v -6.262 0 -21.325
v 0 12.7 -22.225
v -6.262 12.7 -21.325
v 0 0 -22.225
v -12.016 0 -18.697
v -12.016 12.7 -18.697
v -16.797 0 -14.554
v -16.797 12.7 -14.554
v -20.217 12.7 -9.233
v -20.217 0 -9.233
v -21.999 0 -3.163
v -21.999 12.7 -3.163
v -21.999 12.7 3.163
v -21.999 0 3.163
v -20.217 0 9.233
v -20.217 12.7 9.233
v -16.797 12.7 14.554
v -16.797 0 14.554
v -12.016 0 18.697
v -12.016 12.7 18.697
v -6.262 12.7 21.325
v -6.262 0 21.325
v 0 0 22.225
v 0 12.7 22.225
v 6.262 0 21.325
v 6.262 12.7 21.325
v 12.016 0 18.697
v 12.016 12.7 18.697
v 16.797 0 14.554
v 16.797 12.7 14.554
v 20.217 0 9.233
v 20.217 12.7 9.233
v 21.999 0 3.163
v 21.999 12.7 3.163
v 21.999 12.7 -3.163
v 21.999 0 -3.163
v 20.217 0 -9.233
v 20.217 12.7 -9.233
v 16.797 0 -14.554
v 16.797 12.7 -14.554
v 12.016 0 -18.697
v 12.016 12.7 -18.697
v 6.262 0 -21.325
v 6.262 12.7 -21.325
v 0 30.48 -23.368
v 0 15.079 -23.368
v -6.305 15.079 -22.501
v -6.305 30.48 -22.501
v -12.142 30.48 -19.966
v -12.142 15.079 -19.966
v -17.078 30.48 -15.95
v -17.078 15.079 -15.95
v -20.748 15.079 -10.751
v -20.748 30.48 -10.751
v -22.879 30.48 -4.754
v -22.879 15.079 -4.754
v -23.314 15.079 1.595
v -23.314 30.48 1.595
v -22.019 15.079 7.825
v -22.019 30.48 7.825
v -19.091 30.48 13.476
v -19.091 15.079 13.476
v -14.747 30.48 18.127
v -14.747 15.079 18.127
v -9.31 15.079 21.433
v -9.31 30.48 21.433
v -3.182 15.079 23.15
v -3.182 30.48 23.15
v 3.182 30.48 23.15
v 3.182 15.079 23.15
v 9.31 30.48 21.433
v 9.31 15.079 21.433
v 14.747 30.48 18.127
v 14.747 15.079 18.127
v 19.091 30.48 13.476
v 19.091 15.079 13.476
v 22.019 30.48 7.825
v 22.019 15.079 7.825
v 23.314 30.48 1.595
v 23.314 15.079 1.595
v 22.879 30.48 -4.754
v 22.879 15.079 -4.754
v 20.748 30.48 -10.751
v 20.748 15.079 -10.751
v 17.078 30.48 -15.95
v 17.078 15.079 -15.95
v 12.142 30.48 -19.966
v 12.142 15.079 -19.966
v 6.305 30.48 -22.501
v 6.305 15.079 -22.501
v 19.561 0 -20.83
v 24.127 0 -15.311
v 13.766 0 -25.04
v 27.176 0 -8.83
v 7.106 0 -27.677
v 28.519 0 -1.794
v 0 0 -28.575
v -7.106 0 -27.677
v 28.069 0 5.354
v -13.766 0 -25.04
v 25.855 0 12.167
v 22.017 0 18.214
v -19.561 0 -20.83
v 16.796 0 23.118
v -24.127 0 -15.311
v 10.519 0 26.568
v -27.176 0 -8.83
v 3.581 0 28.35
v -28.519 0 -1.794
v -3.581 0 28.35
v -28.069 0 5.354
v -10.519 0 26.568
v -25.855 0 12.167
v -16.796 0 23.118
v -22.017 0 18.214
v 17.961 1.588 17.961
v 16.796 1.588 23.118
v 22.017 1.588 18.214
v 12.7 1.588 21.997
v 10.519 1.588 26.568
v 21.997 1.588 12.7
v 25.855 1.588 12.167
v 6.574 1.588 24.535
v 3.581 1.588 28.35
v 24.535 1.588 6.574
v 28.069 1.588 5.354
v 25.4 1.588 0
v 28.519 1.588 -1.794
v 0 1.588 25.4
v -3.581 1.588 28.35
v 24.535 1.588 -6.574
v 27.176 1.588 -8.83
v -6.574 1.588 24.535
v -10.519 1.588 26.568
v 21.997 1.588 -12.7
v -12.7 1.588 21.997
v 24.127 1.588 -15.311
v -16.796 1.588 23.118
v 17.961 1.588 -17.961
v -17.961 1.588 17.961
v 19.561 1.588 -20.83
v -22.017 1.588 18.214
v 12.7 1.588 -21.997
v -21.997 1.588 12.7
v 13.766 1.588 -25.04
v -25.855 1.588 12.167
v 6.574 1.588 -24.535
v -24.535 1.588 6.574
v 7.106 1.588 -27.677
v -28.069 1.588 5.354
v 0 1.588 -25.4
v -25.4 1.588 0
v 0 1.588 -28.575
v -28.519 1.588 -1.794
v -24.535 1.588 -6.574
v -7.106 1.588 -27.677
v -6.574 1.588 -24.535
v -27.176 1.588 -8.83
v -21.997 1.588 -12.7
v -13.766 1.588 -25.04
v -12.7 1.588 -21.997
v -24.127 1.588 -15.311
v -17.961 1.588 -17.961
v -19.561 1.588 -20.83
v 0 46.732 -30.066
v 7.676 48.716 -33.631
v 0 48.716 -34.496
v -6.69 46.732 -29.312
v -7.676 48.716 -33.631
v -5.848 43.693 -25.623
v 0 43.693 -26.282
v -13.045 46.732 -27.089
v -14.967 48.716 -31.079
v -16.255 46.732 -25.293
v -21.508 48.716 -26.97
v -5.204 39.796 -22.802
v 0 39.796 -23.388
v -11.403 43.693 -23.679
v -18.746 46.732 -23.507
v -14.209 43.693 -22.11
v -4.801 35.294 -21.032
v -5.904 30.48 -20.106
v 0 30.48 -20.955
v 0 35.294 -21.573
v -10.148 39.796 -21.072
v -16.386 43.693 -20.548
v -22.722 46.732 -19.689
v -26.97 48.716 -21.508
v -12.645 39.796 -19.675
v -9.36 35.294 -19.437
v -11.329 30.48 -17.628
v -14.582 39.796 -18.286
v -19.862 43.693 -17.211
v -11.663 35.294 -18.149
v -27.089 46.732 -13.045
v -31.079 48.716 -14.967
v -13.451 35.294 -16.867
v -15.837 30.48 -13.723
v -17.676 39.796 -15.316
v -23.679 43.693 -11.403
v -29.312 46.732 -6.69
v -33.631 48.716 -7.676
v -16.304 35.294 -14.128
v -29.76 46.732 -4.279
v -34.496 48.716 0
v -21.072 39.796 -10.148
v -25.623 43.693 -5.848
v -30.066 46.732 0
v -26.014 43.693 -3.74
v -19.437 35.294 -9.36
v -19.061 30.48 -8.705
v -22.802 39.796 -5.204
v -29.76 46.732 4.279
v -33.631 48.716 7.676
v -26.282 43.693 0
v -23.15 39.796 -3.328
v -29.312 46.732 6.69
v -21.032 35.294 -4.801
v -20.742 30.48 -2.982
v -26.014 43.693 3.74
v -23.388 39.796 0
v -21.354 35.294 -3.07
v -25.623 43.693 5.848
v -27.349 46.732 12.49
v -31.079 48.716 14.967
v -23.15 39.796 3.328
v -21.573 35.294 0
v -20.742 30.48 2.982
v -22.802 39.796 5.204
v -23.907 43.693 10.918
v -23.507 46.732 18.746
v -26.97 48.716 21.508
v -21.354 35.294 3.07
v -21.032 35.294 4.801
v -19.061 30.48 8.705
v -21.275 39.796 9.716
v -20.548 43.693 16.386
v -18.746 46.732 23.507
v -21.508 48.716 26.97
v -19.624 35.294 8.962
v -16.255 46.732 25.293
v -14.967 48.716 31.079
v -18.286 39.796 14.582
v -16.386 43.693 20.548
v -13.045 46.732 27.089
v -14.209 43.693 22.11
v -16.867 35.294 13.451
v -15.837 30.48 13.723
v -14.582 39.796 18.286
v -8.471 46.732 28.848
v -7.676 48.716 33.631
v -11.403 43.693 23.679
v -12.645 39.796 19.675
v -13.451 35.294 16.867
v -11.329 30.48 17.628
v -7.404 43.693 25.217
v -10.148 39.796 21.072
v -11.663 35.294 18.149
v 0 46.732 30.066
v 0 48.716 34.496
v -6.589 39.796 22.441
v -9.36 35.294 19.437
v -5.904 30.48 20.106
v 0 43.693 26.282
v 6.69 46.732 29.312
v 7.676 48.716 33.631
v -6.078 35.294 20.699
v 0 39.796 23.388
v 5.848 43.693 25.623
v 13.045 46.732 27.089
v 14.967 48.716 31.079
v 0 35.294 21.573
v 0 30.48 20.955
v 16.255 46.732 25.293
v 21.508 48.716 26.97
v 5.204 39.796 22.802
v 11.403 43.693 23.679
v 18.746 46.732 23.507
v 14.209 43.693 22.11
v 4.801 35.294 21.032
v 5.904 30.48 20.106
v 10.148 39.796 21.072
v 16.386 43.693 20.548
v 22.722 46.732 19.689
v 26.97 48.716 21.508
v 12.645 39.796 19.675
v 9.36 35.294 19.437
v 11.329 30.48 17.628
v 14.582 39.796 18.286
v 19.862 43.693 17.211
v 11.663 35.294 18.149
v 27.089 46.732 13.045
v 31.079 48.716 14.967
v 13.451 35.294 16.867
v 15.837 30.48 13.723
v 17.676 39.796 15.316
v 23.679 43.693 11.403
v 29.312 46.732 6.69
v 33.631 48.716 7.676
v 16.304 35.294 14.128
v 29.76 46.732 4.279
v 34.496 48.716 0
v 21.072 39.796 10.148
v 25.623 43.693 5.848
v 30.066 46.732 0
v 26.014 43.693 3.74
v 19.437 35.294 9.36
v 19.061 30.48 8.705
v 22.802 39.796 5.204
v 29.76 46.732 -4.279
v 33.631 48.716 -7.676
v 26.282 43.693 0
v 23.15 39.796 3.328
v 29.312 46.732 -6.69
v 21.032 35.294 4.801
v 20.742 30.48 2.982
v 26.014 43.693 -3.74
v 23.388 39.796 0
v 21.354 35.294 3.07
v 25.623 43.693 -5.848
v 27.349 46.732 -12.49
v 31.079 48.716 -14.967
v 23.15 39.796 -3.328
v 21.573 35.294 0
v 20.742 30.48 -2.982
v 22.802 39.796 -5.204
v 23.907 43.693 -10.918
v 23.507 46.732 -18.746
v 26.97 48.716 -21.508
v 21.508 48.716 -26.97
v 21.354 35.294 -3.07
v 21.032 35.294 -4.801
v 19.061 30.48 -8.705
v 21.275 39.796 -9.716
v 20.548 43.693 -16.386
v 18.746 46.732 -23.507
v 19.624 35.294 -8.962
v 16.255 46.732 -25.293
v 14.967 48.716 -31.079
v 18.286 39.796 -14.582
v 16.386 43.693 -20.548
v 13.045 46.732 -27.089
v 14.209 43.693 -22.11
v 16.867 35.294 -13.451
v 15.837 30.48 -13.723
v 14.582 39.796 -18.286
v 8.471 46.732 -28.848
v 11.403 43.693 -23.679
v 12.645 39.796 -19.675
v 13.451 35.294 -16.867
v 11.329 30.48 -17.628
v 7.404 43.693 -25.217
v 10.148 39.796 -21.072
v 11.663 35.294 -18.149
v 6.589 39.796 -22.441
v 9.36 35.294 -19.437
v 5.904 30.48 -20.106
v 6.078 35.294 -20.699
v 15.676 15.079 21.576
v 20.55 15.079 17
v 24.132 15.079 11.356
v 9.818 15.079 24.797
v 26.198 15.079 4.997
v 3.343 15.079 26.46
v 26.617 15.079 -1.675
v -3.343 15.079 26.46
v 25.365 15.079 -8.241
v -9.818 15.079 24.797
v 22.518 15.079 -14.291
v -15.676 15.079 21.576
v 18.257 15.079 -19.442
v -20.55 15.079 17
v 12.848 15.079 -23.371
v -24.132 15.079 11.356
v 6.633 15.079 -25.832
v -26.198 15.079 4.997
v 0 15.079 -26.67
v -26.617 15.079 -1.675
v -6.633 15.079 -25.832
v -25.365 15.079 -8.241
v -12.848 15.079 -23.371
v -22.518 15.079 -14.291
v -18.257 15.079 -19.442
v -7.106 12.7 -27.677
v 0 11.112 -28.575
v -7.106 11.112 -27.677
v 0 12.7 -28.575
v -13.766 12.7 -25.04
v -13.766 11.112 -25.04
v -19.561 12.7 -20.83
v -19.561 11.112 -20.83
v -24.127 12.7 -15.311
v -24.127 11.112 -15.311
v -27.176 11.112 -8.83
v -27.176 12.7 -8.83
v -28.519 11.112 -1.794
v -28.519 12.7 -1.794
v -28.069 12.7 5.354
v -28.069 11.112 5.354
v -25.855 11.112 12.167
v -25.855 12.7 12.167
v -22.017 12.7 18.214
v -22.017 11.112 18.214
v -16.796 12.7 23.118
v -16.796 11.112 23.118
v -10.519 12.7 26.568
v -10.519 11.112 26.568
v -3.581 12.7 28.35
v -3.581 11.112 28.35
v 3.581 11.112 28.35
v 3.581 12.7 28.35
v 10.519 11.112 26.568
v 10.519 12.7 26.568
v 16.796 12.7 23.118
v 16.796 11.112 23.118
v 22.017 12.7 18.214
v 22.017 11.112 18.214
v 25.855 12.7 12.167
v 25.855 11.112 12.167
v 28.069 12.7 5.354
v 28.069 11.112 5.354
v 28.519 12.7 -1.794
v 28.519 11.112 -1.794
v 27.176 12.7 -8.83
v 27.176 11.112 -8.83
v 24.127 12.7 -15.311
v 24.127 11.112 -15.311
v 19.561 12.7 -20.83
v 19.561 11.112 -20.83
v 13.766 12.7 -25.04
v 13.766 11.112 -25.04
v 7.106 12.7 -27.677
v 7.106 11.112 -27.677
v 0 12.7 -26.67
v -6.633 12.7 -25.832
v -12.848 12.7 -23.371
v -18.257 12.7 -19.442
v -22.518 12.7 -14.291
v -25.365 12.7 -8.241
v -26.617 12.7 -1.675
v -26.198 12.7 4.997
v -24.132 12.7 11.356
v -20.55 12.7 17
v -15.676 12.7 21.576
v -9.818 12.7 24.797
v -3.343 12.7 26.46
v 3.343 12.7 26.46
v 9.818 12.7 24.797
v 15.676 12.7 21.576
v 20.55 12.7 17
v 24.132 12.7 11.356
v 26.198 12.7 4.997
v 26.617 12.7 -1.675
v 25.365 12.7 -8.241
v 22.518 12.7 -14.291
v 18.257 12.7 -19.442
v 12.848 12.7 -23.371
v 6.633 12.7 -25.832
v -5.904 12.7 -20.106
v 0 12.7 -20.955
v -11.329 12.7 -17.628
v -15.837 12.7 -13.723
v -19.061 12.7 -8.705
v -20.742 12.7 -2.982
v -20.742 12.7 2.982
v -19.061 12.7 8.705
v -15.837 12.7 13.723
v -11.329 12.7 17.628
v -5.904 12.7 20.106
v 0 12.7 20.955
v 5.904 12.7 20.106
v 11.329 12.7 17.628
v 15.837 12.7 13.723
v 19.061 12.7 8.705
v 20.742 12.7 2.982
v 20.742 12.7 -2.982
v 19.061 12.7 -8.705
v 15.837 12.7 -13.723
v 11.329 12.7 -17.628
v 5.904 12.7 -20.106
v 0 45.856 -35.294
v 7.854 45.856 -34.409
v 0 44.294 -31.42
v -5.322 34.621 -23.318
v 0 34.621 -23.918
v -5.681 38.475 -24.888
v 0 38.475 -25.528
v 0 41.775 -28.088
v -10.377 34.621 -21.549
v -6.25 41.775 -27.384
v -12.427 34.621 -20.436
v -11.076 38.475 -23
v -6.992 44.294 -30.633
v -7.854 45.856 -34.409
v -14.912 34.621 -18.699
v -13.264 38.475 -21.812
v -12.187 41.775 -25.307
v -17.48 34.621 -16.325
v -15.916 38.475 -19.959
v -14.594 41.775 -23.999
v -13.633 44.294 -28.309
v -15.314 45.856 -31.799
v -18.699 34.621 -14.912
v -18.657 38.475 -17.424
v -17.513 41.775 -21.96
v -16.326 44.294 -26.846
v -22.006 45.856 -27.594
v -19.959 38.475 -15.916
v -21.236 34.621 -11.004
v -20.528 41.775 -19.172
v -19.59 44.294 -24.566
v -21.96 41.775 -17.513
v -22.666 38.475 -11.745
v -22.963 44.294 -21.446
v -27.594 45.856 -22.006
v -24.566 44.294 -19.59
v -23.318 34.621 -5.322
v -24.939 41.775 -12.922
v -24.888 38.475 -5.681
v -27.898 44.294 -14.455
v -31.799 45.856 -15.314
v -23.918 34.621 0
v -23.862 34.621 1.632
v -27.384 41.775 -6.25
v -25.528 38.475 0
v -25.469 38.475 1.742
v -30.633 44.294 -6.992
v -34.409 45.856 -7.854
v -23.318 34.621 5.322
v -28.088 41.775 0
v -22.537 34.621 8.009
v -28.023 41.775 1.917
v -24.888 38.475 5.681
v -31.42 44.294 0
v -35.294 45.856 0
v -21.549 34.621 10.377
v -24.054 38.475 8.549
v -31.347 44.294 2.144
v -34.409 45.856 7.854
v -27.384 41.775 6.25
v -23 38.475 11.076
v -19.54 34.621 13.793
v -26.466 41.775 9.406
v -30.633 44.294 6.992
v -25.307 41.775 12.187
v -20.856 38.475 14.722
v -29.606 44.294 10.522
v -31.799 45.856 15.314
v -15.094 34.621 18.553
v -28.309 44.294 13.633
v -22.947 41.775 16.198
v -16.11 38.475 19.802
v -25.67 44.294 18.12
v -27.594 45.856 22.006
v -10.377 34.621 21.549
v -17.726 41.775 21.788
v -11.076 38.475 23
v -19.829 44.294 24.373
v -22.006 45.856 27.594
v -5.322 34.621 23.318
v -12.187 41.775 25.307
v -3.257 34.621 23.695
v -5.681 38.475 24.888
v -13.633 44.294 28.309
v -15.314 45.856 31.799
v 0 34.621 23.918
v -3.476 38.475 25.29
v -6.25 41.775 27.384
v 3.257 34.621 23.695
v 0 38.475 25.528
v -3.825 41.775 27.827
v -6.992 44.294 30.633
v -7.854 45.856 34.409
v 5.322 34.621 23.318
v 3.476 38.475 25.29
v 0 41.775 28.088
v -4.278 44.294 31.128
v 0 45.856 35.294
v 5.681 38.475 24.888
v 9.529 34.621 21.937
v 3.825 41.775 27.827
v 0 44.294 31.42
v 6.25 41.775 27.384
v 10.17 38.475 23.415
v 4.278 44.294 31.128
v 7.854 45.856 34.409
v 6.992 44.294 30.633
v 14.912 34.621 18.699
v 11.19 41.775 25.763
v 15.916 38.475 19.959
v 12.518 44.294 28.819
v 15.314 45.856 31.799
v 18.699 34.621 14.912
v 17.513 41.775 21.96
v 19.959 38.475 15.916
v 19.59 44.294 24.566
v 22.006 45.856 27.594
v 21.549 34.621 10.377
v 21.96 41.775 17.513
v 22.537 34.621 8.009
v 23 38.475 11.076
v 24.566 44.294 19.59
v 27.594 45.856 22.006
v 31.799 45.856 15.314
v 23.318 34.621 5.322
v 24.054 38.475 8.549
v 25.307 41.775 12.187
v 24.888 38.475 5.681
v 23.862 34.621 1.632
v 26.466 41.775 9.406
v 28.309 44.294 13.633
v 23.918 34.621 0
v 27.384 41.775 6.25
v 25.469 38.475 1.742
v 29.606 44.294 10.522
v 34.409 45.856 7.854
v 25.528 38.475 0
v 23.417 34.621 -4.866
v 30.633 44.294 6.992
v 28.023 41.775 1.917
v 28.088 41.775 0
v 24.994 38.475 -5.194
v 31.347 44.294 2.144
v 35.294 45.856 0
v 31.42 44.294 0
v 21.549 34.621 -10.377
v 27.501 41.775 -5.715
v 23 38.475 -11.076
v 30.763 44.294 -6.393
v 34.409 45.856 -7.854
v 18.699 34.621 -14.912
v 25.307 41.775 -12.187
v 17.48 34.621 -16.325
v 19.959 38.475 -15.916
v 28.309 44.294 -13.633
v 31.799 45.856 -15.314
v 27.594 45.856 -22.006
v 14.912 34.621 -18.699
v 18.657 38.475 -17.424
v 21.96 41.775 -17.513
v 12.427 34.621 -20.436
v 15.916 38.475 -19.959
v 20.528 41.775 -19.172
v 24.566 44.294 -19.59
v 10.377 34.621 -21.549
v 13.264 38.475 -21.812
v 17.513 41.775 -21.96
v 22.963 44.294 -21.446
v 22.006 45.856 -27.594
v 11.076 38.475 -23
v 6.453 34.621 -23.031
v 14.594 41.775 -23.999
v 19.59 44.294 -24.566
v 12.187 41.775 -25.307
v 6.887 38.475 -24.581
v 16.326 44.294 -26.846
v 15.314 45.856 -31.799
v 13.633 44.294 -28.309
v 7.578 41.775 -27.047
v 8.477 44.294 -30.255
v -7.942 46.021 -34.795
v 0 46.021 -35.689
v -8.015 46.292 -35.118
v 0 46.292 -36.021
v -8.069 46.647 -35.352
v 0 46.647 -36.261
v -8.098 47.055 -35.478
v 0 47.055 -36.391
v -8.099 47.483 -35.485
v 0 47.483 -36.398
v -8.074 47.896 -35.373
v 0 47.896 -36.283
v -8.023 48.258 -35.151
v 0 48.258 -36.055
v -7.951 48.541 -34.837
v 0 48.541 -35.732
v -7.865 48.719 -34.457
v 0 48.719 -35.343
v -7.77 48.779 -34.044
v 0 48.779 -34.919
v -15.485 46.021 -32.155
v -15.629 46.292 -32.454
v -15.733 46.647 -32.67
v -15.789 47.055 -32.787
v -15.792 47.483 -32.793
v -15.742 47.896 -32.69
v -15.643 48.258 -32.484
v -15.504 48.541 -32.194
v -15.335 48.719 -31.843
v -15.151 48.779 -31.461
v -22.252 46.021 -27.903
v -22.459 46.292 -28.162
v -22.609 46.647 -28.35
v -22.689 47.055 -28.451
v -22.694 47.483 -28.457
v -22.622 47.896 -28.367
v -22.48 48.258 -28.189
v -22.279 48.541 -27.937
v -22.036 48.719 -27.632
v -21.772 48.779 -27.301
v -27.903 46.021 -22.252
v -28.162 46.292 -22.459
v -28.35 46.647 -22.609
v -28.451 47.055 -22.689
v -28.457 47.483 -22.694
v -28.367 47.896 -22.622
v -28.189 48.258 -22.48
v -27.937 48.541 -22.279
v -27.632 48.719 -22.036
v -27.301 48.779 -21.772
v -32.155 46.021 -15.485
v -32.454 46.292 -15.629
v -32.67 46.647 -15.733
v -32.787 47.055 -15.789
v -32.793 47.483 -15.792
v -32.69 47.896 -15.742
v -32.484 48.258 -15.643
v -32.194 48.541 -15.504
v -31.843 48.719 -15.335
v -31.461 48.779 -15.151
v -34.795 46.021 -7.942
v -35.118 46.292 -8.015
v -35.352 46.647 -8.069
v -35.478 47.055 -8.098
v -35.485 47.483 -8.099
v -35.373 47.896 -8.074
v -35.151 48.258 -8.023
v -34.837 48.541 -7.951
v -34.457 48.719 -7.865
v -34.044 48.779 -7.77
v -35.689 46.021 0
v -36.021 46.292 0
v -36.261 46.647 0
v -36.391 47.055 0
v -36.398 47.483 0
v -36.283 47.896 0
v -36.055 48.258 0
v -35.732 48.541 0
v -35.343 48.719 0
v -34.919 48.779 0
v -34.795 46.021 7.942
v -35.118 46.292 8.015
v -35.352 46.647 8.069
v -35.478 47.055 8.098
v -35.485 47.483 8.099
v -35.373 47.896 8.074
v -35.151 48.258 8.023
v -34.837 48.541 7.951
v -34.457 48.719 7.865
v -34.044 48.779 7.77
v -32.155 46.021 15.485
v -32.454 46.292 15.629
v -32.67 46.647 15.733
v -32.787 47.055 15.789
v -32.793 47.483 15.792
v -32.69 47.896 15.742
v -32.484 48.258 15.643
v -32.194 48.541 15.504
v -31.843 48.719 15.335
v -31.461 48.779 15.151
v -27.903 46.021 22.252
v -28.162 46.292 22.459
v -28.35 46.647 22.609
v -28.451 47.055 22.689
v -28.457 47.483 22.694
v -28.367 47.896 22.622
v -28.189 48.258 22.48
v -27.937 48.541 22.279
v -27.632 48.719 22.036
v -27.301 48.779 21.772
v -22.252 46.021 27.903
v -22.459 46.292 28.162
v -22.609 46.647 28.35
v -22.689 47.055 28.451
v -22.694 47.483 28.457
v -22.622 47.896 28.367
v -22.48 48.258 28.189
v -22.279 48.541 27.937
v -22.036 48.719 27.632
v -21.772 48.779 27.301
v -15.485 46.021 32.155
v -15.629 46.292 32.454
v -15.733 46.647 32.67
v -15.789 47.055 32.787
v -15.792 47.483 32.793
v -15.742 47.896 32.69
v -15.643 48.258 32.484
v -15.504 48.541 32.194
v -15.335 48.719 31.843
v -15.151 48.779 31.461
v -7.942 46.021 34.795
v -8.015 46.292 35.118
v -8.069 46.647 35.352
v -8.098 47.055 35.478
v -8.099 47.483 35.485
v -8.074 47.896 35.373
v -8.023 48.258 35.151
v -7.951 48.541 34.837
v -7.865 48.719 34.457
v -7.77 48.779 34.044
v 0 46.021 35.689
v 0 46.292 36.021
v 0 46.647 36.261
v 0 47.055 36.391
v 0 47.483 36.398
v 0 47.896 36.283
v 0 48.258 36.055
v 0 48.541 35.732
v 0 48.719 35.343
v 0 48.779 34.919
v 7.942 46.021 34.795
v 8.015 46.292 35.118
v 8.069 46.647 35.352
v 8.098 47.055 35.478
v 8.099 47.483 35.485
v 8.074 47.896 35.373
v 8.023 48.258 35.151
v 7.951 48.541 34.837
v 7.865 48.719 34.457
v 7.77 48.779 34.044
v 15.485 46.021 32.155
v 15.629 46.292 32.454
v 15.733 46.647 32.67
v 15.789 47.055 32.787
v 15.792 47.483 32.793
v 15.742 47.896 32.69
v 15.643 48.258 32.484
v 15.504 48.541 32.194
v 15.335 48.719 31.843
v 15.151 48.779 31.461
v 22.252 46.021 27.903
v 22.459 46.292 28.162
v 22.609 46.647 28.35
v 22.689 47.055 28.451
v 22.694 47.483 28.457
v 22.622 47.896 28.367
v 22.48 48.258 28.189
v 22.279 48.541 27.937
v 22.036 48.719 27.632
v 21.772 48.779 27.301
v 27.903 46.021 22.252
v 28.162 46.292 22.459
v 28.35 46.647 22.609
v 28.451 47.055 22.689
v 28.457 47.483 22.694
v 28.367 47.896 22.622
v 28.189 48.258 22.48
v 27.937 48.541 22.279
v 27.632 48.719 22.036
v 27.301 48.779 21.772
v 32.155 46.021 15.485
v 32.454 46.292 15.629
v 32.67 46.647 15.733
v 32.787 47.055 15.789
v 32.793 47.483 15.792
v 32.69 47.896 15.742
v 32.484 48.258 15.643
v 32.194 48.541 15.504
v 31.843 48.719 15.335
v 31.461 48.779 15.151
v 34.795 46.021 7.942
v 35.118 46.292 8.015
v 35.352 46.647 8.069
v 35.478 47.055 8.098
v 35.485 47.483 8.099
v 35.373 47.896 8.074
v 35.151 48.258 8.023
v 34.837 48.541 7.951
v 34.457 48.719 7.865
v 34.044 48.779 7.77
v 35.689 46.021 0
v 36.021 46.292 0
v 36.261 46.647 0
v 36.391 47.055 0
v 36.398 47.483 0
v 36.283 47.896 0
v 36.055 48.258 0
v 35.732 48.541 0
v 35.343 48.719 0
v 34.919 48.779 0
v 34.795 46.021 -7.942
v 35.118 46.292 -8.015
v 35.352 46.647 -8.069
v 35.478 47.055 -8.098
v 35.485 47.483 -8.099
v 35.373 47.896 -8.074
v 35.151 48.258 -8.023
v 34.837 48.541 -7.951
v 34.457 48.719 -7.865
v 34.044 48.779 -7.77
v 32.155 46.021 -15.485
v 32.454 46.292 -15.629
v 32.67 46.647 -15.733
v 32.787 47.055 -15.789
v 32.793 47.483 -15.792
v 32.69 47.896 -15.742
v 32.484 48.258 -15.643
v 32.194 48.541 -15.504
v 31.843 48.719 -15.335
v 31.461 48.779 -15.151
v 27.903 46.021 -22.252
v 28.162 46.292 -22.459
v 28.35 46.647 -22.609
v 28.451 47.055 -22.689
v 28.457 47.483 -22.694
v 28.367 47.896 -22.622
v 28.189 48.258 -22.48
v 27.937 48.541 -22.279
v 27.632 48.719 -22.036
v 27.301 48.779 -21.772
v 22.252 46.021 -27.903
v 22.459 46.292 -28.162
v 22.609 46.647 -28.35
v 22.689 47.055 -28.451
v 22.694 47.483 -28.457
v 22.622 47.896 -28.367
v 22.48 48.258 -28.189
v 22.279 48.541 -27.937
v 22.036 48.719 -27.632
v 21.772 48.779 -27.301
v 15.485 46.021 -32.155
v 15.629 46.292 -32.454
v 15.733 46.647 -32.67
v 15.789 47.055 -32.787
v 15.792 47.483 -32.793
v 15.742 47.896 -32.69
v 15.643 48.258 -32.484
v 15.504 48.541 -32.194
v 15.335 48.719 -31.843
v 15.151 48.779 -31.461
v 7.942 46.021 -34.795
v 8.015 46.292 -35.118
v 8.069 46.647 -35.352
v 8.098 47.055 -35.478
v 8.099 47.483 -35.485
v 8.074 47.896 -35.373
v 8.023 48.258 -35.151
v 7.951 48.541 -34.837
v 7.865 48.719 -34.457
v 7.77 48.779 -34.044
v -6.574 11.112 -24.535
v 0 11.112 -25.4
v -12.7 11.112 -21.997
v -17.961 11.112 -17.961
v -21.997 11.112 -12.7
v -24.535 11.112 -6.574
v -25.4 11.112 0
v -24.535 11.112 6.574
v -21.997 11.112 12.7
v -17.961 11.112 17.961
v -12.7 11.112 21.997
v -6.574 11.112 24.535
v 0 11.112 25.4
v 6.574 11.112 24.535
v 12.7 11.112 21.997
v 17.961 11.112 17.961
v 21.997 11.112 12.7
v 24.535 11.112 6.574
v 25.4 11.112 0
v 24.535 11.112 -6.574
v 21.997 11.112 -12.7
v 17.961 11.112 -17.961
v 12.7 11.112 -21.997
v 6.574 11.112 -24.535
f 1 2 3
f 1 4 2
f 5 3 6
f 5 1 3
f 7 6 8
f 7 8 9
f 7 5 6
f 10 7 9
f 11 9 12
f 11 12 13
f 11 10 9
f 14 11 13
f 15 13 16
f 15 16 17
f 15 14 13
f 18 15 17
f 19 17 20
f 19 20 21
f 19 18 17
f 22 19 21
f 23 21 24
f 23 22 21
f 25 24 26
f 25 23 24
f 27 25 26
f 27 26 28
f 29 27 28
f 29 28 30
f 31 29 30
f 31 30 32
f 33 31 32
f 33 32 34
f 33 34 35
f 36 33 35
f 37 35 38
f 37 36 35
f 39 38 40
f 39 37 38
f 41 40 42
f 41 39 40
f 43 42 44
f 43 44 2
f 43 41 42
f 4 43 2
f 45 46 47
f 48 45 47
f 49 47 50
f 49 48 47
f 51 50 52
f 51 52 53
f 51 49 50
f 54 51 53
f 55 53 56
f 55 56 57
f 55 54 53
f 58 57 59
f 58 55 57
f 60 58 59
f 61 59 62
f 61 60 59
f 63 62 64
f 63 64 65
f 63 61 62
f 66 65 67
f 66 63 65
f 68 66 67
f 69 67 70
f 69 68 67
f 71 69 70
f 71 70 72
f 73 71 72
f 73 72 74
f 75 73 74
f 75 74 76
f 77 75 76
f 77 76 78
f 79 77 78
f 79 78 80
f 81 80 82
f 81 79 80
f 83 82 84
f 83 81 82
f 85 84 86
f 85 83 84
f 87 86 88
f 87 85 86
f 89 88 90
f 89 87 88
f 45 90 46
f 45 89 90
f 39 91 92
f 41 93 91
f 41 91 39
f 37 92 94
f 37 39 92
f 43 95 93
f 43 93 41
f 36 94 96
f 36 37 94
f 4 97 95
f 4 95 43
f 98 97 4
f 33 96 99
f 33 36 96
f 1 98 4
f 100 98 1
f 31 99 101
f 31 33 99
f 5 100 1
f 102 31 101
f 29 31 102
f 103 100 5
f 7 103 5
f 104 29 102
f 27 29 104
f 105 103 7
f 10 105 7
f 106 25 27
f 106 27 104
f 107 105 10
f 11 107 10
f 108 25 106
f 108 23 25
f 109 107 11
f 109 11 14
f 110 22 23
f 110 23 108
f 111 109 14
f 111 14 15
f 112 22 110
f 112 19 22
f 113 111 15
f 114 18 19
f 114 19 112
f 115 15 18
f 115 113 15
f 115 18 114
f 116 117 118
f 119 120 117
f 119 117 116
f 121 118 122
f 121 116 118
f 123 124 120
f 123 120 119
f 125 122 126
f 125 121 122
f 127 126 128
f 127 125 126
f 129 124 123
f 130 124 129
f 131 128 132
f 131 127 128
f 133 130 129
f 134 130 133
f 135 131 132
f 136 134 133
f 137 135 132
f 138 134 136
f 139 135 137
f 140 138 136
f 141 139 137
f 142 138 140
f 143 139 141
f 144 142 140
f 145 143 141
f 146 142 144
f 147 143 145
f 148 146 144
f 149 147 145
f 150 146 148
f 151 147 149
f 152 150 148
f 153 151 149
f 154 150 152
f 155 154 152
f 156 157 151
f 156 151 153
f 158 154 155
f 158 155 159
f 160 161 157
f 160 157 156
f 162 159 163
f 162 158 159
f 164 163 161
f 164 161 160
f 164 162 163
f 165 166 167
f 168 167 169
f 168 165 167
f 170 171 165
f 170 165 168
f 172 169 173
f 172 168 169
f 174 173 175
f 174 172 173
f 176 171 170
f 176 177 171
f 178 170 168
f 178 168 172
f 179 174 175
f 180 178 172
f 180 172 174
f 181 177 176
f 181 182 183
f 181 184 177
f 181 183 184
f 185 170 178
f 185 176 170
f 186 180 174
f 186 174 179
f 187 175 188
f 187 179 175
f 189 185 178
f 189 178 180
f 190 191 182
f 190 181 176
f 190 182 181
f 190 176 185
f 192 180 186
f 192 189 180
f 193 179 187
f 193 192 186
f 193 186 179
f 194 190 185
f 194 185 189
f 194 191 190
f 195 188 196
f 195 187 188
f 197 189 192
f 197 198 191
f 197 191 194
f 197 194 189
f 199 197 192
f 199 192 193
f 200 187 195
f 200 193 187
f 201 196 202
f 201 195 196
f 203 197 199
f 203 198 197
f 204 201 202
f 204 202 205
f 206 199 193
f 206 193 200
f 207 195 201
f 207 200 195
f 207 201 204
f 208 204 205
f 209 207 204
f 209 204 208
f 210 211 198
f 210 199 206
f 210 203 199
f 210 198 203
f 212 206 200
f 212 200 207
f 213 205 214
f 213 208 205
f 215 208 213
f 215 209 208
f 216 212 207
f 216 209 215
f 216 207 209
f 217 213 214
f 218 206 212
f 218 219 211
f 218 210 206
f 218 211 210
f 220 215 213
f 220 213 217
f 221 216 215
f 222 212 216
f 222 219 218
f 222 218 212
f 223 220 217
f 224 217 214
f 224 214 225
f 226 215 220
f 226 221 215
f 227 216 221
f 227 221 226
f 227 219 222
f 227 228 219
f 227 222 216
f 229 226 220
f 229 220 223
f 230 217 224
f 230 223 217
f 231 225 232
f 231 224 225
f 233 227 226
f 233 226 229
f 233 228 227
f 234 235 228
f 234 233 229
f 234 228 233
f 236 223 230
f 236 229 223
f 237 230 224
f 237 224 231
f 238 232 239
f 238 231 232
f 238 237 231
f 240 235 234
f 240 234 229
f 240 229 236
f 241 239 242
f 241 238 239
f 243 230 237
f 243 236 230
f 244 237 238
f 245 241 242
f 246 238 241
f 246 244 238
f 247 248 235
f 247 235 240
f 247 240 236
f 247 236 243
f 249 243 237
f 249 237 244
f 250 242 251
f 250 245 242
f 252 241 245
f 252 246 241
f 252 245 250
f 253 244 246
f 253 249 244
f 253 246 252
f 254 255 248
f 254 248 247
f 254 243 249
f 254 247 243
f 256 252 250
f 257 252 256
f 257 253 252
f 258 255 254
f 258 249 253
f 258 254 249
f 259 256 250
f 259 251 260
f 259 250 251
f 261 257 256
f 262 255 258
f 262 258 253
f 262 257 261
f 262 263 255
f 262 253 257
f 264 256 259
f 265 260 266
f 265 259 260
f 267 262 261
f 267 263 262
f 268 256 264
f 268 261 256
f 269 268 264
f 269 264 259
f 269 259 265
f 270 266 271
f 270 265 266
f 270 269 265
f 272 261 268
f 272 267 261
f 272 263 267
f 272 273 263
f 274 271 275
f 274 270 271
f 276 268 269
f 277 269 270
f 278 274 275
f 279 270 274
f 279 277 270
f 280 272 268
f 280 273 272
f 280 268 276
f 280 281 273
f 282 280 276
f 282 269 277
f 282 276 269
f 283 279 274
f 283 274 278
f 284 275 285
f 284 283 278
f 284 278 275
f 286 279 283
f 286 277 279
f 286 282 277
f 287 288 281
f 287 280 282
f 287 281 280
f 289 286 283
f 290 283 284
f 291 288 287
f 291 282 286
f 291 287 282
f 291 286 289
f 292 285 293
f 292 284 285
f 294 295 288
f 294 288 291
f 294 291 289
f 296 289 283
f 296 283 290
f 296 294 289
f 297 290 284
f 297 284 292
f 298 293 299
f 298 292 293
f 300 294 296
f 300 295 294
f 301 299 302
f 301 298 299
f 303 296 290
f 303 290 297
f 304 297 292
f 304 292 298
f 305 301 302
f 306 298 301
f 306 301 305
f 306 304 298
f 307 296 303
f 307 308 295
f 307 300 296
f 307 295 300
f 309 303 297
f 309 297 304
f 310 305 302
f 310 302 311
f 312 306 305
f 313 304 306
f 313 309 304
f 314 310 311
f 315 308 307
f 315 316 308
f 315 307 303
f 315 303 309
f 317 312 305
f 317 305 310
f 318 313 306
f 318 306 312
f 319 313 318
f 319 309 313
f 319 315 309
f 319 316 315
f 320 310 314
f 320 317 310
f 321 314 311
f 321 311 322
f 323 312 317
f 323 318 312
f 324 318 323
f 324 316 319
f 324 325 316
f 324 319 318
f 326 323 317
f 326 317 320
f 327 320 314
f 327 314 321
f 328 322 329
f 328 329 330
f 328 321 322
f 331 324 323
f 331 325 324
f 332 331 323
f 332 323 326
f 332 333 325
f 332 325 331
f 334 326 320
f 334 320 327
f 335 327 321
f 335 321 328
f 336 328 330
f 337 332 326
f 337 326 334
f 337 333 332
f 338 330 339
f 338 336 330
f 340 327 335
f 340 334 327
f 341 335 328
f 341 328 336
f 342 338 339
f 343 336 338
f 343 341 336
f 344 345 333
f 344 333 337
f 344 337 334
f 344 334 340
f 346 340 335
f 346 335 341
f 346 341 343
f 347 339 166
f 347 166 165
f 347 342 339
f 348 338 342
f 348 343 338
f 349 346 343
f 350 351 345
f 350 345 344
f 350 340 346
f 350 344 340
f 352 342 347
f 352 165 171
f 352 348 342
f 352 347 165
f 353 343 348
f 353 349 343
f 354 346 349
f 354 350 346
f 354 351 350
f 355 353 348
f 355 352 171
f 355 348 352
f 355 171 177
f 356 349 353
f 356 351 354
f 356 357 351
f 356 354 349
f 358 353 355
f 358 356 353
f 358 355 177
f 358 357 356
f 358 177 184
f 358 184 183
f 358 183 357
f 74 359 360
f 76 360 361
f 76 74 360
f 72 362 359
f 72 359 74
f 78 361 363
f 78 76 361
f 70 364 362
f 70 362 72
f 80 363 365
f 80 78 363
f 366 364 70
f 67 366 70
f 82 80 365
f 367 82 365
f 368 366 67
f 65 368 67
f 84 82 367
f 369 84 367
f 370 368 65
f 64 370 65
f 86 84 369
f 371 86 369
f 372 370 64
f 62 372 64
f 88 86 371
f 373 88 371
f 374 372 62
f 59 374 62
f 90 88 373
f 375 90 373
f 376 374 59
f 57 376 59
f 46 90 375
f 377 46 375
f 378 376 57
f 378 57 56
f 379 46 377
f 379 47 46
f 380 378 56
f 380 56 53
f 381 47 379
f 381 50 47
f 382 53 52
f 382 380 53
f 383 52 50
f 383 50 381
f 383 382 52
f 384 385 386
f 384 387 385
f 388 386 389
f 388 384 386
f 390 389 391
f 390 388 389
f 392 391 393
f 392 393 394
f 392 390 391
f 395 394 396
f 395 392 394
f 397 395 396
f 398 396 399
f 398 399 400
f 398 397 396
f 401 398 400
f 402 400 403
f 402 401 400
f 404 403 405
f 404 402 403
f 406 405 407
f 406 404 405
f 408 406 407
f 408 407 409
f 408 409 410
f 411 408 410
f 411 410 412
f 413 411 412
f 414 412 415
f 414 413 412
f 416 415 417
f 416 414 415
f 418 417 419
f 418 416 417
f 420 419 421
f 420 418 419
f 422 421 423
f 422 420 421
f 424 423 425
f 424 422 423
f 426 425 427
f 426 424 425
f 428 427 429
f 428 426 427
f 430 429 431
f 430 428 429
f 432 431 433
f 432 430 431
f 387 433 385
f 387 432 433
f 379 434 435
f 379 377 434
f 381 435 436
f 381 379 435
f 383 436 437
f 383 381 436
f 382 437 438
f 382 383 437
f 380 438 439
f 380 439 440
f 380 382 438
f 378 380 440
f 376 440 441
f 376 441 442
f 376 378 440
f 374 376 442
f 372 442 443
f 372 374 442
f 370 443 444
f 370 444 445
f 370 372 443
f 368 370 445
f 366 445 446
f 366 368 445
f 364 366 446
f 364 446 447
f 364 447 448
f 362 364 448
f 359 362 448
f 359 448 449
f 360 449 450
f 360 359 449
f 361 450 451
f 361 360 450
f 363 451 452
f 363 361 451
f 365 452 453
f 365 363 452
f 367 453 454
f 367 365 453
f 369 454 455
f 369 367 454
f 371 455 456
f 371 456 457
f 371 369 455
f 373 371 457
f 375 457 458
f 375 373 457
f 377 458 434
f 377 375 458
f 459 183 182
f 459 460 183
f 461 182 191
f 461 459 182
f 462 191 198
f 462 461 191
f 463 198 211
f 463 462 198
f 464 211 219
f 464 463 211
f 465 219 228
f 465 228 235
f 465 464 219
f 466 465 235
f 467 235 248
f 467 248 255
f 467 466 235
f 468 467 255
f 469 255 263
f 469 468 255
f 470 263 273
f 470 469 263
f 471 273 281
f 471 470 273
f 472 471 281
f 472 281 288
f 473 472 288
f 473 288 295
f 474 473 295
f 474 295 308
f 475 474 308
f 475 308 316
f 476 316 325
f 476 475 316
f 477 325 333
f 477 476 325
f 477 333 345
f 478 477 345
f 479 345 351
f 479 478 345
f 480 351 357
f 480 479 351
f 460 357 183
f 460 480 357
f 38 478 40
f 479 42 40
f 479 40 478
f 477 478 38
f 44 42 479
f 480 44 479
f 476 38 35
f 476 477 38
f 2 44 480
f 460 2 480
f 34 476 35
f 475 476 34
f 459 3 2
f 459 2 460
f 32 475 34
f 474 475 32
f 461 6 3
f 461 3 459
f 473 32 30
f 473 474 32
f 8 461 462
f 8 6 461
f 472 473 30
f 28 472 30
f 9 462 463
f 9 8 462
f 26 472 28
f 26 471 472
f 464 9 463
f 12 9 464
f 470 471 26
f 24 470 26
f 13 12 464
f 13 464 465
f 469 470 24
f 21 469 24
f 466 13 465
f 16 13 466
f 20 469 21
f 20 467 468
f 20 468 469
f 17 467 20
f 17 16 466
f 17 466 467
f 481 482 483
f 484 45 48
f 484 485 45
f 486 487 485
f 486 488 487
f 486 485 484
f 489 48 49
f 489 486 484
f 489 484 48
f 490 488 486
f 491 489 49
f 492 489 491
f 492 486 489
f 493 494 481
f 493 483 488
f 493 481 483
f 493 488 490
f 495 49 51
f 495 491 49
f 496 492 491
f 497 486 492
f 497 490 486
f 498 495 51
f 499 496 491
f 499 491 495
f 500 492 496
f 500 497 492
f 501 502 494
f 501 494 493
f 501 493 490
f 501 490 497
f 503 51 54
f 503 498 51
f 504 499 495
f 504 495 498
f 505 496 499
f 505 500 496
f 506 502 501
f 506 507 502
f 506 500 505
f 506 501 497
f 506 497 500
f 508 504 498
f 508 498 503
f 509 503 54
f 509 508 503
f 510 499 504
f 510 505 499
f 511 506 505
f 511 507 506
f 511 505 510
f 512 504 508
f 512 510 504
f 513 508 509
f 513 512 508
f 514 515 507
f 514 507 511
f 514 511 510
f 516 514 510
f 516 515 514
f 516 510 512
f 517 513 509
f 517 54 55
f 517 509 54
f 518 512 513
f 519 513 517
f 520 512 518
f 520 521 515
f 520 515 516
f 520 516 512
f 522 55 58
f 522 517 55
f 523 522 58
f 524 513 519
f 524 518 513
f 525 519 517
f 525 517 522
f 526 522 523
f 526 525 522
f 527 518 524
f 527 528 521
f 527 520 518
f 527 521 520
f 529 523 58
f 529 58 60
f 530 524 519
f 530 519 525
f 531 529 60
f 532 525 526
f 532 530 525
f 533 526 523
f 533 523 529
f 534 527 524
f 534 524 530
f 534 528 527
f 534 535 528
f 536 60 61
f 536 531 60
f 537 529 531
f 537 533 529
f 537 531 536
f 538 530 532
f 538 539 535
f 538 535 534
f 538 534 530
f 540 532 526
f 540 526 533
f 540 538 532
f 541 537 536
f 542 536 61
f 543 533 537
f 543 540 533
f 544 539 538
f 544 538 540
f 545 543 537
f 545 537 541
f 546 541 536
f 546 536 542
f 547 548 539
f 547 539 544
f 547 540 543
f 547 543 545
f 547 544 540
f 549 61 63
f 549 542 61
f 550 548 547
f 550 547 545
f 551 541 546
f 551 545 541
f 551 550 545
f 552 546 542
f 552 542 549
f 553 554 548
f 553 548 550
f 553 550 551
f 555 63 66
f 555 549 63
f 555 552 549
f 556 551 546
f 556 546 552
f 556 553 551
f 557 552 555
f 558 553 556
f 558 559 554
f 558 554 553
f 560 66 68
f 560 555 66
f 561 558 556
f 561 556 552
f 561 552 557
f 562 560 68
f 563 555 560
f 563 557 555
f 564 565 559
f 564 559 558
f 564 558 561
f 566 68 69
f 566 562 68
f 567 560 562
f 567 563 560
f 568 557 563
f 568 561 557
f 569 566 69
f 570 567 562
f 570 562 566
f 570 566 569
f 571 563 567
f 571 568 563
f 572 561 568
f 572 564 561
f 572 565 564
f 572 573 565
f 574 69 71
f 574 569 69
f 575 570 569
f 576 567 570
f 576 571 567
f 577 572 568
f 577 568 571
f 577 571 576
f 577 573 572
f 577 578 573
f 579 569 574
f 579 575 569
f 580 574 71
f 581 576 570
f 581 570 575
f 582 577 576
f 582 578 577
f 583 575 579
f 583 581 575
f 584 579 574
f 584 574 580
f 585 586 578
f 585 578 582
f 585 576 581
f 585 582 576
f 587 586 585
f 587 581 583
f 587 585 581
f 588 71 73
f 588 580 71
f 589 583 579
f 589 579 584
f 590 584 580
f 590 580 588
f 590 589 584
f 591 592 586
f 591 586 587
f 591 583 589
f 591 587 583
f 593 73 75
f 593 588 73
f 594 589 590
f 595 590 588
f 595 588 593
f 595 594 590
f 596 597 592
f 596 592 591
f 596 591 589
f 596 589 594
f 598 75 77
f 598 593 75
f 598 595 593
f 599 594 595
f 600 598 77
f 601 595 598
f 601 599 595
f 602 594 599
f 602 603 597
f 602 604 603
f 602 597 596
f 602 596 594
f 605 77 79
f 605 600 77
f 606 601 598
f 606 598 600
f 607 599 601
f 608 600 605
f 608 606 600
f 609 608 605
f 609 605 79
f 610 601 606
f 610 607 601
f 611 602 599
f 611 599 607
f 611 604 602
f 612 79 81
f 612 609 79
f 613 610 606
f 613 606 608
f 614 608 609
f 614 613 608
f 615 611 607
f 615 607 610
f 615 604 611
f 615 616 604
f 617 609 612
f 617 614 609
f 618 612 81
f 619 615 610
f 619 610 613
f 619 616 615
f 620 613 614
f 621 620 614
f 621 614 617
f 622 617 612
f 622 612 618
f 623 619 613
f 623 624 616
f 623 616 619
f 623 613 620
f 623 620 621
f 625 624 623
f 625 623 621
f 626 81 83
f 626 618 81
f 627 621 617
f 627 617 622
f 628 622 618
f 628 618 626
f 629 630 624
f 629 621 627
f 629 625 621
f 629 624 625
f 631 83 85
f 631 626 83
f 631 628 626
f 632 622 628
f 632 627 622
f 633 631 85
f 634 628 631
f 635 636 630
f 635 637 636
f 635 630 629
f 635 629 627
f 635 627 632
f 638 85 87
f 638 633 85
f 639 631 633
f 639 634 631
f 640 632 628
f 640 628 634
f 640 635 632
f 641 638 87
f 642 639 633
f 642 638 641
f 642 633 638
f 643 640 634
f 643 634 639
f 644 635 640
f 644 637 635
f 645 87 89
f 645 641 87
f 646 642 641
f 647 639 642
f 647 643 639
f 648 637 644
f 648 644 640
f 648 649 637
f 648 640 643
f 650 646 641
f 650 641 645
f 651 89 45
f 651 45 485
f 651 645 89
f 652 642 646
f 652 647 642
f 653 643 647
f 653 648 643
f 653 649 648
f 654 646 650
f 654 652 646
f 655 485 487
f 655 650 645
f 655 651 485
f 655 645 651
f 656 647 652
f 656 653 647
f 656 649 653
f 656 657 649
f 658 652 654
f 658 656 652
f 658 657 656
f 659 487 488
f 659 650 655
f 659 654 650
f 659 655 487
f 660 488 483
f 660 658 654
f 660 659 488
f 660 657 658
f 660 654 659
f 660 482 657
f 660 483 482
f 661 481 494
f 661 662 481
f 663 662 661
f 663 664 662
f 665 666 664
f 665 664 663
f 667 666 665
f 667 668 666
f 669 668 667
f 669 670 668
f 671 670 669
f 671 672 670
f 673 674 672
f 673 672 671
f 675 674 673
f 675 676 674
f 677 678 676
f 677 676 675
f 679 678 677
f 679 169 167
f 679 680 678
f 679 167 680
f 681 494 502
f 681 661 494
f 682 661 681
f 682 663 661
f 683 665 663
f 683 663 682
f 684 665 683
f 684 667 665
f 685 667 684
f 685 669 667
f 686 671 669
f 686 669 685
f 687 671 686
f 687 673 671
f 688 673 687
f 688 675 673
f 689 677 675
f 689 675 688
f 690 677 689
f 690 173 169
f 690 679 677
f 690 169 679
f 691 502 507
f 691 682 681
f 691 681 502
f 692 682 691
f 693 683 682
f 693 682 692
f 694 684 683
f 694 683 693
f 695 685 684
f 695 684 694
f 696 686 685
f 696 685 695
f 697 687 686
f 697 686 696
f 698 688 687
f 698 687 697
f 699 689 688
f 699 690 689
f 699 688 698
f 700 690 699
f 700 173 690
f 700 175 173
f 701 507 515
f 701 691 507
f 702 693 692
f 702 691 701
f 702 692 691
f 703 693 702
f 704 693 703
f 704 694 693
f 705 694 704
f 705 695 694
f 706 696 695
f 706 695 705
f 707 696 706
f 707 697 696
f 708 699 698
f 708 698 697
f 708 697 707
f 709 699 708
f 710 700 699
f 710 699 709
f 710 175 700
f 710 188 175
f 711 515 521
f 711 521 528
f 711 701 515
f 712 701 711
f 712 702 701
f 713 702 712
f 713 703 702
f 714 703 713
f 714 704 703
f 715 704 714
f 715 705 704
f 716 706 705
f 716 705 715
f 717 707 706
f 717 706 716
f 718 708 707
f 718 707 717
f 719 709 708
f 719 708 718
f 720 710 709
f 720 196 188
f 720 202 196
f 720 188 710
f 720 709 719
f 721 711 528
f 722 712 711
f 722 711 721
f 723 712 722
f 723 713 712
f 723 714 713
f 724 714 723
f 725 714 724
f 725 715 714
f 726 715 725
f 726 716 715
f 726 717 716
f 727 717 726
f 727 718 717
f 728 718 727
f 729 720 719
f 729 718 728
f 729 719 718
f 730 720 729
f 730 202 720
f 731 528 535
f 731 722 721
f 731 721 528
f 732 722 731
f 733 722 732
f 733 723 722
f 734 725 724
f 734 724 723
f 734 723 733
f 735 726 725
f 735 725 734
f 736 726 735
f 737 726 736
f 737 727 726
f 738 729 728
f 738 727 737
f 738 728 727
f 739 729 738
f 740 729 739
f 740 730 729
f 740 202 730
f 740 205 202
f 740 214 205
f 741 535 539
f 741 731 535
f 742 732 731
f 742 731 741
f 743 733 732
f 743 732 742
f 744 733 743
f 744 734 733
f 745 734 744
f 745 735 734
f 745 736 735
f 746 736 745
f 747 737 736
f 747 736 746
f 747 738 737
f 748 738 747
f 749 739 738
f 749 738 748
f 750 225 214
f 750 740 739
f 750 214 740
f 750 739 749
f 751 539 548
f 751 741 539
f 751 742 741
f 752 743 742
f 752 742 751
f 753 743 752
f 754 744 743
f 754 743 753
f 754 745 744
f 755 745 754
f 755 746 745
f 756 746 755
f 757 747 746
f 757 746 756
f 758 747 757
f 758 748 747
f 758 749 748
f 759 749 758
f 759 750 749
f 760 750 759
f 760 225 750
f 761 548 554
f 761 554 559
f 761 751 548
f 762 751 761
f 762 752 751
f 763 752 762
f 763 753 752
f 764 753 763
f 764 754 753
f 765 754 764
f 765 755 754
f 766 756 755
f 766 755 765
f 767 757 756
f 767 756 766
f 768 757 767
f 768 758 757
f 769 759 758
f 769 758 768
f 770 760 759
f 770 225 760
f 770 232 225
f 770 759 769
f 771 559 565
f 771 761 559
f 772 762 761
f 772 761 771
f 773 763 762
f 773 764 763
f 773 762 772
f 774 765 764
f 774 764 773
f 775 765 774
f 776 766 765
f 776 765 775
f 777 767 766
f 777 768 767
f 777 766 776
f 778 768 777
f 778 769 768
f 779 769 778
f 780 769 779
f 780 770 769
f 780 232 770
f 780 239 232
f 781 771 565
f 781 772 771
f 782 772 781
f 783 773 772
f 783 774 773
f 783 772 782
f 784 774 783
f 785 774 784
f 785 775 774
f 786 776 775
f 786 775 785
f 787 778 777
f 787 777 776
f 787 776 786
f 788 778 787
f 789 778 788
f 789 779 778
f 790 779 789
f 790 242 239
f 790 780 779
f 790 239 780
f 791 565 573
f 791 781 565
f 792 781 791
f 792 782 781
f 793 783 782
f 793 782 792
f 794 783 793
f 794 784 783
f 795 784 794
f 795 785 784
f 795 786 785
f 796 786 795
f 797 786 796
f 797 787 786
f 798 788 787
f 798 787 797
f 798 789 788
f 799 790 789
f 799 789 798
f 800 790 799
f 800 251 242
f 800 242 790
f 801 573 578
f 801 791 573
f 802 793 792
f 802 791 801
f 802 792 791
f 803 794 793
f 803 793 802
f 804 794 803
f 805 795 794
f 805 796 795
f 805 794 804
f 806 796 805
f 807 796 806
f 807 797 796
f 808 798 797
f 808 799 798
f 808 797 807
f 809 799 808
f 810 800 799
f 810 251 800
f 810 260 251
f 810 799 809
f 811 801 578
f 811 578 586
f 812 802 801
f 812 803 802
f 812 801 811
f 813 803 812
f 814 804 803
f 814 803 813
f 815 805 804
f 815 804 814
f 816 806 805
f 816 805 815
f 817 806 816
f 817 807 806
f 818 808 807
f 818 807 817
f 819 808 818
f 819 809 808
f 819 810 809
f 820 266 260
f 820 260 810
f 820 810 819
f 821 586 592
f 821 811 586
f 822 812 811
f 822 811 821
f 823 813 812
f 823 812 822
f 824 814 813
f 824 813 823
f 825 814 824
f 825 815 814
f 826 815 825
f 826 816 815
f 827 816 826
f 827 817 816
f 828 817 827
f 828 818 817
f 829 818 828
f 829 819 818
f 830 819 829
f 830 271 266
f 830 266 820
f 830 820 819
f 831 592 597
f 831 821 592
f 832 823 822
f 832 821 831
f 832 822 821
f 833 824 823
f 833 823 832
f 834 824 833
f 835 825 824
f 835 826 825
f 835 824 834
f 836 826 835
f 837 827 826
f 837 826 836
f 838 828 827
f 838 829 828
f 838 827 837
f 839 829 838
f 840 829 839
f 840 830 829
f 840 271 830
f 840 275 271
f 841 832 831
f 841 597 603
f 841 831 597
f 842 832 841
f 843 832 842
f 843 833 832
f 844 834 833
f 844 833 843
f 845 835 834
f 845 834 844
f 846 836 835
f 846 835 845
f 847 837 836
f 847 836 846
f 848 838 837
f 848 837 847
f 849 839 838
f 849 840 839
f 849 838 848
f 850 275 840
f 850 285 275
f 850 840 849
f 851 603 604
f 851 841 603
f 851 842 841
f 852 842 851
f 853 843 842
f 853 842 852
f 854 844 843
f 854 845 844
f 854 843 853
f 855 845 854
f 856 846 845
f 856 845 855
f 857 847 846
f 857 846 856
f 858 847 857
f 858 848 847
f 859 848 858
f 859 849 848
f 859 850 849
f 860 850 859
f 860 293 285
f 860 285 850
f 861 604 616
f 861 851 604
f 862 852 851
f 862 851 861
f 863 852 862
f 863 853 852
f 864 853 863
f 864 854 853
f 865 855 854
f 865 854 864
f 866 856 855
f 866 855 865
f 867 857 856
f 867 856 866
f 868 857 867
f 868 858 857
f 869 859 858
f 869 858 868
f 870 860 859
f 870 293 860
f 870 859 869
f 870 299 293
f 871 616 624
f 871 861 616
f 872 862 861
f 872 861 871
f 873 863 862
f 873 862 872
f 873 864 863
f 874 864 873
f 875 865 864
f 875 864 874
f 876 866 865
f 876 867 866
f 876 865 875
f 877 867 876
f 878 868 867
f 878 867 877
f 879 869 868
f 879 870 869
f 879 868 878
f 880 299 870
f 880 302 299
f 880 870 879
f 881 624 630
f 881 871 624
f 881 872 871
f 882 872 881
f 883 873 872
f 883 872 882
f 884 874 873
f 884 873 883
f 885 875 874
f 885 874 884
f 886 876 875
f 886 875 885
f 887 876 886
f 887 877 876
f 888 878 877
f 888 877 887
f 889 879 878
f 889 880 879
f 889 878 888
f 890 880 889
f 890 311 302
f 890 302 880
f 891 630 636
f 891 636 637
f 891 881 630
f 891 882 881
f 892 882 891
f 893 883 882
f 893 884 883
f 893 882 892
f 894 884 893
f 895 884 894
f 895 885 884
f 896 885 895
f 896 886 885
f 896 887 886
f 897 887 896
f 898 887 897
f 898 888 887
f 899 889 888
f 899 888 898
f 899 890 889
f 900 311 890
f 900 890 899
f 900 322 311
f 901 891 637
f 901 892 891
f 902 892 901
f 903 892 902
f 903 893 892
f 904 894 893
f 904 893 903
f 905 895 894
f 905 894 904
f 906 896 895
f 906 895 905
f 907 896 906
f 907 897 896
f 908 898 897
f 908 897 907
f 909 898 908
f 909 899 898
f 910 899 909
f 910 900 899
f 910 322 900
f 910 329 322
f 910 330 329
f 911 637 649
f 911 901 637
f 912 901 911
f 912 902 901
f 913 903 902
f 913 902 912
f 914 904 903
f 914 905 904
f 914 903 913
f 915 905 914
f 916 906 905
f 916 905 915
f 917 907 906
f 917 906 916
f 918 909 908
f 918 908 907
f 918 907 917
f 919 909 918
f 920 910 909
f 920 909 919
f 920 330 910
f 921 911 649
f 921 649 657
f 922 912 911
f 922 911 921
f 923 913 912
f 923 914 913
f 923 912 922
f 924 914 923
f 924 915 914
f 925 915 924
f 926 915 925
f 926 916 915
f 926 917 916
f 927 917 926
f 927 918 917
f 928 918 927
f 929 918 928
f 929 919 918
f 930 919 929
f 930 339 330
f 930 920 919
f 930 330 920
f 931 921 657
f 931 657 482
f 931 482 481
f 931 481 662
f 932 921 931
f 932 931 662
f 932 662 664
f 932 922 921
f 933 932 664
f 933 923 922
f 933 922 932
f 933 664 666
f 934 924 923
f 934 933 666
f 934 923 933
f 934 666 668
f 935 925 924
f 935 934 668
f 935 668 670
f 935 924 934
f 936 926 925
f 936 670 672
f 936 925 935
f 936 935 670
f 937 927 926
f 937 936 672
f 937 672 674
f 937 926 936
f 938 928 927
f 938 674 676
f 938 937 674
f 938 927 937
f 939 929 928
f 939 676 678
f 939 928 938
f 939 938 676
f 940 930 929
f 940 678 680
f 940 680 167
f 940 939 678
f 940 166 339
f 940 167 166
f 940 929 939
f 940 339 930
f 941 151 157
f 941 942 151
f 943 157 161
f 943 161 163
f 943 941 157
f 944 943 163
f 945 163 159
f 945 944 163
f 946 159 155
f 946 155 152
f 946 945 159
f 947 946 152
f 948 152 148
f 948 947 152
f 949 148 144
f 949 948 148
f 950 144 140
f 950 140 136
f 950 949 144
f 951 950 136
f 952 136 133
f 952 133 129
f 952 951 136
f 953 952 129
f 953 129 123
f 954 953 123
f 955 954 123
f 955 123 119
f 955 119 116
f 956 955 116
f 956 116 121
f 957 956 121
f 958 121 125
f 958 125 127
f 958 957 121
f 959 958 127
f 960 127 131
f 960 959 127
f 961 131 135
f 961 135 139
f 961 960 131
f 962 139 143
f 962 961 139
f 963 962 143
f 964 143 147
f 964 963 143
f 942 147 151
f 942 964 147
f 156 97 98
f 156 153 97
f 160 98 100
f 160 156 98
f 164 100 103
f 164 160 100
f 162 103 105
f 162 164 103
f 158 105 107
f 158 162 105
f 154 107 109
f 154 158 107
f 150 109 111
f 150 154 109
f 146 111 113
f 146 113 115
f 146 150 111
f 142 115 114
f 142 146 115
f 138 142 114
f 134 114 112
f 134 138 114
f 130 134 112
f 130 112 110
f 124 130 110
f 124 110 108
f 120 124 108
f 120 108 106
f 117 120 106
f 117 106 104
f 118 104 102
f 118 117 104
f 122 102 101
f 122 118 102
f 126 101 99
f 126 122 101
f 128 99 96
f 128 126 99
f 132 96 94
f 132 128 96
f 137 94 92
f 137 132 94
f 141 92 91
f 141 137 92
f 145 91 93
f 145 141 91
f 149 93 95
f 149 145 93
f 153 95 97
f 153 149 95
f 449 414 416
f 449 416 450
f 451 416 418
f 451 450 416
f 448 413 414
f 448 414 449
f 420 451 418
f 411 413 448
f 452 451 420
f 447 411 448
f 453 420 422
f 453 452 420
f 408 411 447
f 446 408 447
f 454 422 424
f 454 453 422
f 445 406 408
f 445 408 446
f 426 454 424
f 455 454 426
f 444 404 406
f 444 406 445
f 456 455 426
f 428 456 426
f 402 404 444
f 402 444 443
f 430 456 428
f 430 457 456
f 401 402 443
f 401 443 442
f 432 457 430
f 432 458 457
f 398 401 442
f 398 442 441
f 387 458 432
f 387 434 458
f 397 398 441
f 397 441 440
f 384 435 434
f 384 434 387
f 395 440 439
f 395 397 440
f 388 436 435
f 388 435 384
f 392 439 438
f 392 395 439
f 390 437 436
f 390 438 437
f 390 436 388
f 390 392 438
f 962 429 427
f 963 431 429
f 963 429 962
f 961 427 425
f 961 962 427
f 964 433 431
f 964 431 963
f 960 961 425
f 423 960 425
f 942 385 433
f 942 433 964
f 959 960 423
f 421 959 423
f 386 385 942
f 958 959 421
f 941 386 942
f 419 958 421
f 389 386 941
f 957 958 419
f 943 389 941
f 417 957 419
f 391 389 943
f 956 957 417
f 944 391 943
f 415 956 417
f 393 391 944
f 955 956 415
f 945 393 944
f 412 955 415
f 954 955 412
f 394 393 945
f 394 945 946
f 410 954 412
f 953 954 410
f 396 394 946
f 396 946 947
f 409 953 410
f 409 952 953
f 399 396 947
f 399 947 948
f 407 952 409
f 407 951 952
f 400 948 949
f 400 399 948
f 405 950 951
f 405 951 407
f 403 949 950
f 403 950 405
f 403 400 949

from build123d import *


with BuildPart() as part:
    # Sketch2 → Revolve1 (revolve)
    with BuildSketch(Plane.XY, mode=Mode.PRIVATE) as revolve1_sk:
        with BuildLine():
            Line((20.955, 30.48), (20.955, 12.7))
            Line((20.955, 12.7), (22.225, 12.7))
            Line((22.225, 12.7), (22.225, 0))
            Line((22.225, 0), (28.575, 0))
            Line((28.575, 0), (28.575, 1.5875))
            Line((28.575, 1.5875), (25.4, 1.5875))
            Line((25.4, 1.5875), (25.4, 11.1125))
            Line((25.4, 11.1125), (28.575, 11.1125))
            Line((28.575, 11.1125), (28.575, 12.7))
            Line((28.575, 12.7), (26.67, 12.7))
            Line((26.67, 12.7), (26.67, 15.079229731))
            Line((26.67, 15.079229731), (23.368, 15.079229731))
            Line((23.368, 15.079229731), (23.368, 30.48))
            ThreePointArc((23.368, 30.48), (26.699072346, 40.209619932), (35.294362711, 45.856081704))
            ThreePointArc((35.294362711, 45.856081704), (36.355227336, 47.693893747), (34.495528336, 48.715904748))
            ThreePointArc((34.495528336, 48.715904748), (24.710263402, 41.836651461), (20.955, 30.48))
        make_face()
    revolve(revolve1_sk.sketch.rotate(Axis((0, 0, 0), (0, 1, 0)), 90), axis=Axis((0, 0, 0), (0, 1, 0)))


solid = part.part
